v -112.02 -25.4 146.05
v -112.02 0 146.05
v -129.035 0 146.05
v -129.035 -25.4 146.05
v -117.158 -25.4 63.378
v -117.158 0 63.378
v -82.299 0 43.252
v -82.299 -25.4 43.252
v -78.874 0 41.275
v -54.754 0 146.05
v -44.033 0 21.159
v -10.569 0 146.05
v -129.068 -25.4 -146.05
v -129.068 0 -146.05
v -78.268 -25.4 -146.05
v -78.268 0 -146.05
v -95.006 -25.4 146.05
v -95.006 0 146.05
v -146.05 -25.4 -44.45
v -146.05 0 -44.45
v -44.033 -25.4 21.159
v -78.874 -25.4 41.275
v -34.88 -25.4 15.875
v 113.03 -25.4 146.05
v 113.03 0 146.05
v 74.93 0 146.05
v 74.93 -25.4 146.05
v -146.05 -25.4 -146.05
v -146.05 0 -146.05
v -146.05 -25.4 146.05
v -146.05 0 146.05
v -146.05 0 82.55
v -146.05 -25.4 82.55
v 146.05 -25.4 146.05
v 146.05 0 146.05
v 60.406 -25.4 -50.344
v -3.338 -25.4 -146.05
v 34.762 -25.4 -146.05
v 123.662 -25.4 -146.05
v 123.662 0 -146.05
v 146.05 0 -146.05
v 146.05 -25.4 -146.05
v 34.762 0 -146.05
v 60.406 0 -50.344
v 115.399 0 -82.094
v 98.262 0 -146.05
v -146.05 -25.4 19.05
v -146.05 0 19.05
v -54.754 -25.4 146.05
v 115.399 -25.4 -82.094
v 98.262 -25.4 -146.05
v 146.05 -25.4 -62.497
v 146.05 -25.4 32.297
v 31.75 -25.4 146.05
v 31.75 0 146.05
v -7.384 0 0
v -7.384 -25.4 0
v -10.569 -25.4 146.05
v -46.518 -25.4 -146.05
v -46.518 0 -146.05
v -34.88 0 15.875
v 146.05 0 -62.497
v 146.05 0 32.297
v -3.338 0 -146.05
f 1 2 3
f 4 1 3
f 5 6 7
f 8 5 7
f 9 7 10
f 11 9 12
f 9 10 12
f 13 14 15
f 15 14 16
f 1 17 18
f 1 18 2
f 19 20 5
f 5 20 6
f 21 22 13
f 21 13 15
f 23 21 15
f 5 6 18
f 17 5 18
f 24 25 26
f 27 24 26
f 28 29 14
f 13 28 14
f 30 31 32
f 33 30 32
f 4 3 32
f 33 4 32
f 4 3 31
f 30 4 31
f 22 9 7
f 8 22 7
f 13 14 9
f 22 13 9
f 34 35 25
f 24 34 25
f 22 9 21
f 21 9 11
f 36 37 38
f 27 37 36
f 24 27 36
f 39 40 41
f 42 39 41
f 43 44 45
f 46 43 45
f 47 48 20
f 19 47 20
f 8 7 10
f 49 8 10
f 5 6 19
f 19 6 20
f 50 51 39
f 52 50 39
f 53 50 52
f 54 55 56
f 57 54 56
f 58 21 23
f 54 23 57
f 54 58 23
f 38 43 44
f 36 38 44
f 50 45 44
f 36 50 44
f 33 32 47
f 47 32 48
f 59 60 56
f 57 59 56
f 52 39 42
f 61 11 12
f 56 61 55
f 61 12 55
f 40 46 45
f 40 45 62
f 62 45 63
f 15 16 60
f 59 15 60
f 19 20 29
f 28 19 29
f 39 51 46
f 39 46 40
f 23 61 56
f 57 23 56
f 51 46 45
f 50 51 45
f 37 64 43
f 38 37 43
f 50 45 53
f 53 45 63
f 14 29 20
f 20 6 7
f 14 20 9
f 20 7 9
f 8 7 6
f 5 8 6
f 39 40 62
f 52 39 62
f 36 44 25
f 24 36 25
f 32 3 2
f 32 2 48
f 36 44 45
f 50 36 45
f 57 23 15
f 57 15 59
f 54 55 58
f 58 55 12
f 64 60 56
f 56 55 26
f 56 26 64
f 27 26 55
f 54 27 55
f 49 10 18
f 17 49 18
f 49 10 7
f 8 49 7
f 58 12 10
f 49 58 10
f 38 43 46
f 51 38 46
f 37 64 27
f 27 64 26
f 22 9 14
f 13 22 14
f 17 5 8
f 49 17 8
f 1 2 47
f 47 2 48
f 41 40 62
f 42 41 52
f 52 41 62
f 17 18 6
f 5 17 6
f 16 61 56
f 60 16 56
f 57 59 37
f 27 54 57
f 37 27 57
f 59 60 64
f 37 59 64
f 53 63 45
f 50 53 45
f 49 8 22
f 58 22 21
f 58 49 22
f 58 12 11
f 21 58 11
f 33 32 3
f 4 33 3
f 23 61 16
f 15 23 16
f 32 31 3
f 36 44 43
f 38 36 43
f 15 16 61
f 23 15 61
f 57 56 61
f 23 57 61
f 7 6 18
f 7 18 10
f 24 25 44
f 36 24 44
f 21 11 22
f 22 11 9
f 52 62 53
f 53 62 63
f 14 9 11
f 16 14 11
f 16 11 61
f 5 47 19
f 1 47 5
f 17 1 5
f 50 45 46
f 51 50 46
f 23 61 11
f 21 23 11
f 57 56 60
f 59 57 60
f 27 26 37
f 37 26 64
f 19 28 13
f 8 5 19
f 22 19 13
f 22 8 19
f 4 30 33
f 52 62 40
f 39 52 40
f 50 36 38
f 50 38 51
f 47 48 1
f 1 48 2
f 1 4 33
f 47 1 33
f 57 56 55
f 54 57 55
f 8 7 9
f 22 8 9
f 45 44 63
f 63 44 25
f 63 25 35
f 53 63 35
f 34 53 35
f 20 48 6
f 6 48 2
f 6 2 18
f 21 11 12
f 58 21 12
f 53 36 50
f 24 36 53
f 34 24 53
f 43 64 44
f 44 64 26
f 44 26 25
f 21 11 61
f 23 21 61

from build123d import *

# Parameters (mm, degrees)
F2_DEPTH  = 25.4
F3_DEPTH  = 25.4
F4_DEPTH  = 25.4
F5_DEPTH  = 25.4
F6_DEPTH  = 25.4
F7_DEPTH  = 25.4
F8_DEPTH  = 25.4
F9_DEPTH  = 25.4
F10_DEPTH = 25.4
F11_DEPTH = 25.4
F12_DEPTH = 25.4
F13_DEPTH = 25.4
F14_DEPTH = 25.4
F15_DEPTH = 25.4
F16_DEPTH = 25.4


with BuildPart() as f2:
    # F1 (on face) → F2 (new body)
    with BuildSketch(Plane.XZ):
        Polygon((115.398987, -82.094046), (98.262041, -146.05), (123.662041, -146.05), (146.05, -62.496999), (146.05, 32.297091), align=None)
    extrude(amount=F2_DEPTH)


with BuildPart() as f3:
    # F1 (on face) → F3 (new body)
    with BuildSketch(Plane.XZ):
        Polygon((146.05, -62.496999), (123.662041, -146.05), (146.05, -146.05), align=None)
    extrude(amount=F3_DEPTH)


with BuildPart() as f4:
    # F1 (on face) → F4 (new body)
    with BuildSketch(Plane.XZ):
        Polygon((60.406374, -50.344046), (34.762041, -146.05), (98.262041, -146.05), (115.398987, -82.094046), align=None)
    extrude(amount=F4_DEPTH)


with BuildPart() as f5:
    # F1 (on face) → F5 (new body)
    with BuildSketch(Plane.XZ):
        Polygon((113.03, 146.05), (60.406374, -50.344046), (115.398987, -82.094046), (146.05, 32.297091), (146.05, 146.05), align=None)
    extrude(amount=F5_DEPTH)


with BuildPart() as f6:
    # F1 (on face) → F6 (new body)
    with BuildSketch(Plane.XZ):
        Polygon((74.93, 146.05), (-3.337959, -146.05), (34.762041, -146.05), (60.406374, -50.344046), (113.03, 146.05), align=None)
    extrude(amount=F6_DEPTH)


with BuildPart() as f7:
    # F1 (on face) → F7 (new body)
    with BuildSketch(Plane.XZ):
        Polygon((-7.38398, 0), (-46.517959, -146.05), (-3.337959, -146.05), (74.93, 146.05), (31.75, 146.05), align=None)
    extrude(amount=F7_DEPTH)


with BuildPart() as f8:
    # F1 (on face) → F8 (new body)
    with BuildSketch(Plane.XZ):
        Polygon((-34.880286, 15.875), (-78.267959, -146.05), (-46.517959, -146.05), (-7.38398, 0), align=None)
    extrude(amount=F8_DEPTH)


with BuildPart() as f9:
    # F1 (on face) → F9 (new body)
    with BuildSketch(Plane.XZ):
        Polygon((-44.033108, 21.159384), (-34.880286, 15.875), (-7.38398, 0), (31.75, 146.05), (-10.568768, 146.05), align=None)
    extrude(amount=F9_DEPTH)


with BuildPart() as f10:
    # F1 (on face) → F10 (new body)
    with BuildSketch(Plane.XZ):
        Polygon((-82.298625, 43.251991), (-78.874377, 41.275), (-44.033108, 21.159384), (-10.568768, 146.05), (-54.753982, 146.05), align=None)
    extrude(amount=F10_DEPTH)


with BuildPart() as f11:
    # F1 (on face) → F11 (new body)
    with BuildSketch(Plane.XZ):
        Polygon((-78.874377, 41.275), (-129.067959, -146.05), (-78.267959, -146.05), (-34.880286, 15.875), (-44.033108, 21.159384), align=None)
    extrude(amount=F11_DEPTH)


with BuildPart() as f12:
    # F1 (on face) → F12 (new body)
    with BuildSketch(Plane.XZ):
        Polygon((-146.05, -44.45), (-146.05, -146.05), (-129.067959, -146.05), (-78.874377, 41.275), (-82.298625, 43.251991), (-117.157618, 63.377839), align=None)
    extrude(amount=F12_DEPTH)


with BuildPart() as f13:
    # F1 (on face) → F13 (new body)
    with BuildSketch(Plane.XZ):
        Polygon((-95.005679, 146.05), (-117.157618, 63.377839), (-82.298625, 43.251991), (-54.753982, 146.05), align=None)
    extrude(amount=F13_DEPTH)


with BuildPart() as f14:
    # F1 (on face) → F14 (new body)
    with BuildSketch(Plane.XZ):
        Polygon((-146.05, 19.05), (-146.05, -44.45), (-117.157618, 63.377839), (-95.005679, 146.05), (-112.020453, 146.05), align=None)
    extrude(amount=F14_DEPTH)


with BuildPart() as f15:
    # F1 (on face) → F15 (new body)
    with BuildSketch(Plane.XZ):
        Polygon((-146.05, 82.55), (-146.05, 19.05), (-112.020453, 146.05), (-129.035226, 146.05), align=None)
    extrude(amount=F15_DEPTH)


with BuildPart() as f16:
    # F1 (on face) → F16 (new body)
    with BuildSketch(Plane.XZ):
        Polygon((-146.05, 146.05), (-146.05, 82.55), (-129.035226, 146.05), align=None)
    extrude(amount=F16_DEPTH)


solid = Compound([f2.part, f3.part, f4.part, f5.part, f6.part, f7.part, f8.part, f9.part, f10.part, f11.part, f12.part, f13.part, f14.part, f15.part, f16.part])
